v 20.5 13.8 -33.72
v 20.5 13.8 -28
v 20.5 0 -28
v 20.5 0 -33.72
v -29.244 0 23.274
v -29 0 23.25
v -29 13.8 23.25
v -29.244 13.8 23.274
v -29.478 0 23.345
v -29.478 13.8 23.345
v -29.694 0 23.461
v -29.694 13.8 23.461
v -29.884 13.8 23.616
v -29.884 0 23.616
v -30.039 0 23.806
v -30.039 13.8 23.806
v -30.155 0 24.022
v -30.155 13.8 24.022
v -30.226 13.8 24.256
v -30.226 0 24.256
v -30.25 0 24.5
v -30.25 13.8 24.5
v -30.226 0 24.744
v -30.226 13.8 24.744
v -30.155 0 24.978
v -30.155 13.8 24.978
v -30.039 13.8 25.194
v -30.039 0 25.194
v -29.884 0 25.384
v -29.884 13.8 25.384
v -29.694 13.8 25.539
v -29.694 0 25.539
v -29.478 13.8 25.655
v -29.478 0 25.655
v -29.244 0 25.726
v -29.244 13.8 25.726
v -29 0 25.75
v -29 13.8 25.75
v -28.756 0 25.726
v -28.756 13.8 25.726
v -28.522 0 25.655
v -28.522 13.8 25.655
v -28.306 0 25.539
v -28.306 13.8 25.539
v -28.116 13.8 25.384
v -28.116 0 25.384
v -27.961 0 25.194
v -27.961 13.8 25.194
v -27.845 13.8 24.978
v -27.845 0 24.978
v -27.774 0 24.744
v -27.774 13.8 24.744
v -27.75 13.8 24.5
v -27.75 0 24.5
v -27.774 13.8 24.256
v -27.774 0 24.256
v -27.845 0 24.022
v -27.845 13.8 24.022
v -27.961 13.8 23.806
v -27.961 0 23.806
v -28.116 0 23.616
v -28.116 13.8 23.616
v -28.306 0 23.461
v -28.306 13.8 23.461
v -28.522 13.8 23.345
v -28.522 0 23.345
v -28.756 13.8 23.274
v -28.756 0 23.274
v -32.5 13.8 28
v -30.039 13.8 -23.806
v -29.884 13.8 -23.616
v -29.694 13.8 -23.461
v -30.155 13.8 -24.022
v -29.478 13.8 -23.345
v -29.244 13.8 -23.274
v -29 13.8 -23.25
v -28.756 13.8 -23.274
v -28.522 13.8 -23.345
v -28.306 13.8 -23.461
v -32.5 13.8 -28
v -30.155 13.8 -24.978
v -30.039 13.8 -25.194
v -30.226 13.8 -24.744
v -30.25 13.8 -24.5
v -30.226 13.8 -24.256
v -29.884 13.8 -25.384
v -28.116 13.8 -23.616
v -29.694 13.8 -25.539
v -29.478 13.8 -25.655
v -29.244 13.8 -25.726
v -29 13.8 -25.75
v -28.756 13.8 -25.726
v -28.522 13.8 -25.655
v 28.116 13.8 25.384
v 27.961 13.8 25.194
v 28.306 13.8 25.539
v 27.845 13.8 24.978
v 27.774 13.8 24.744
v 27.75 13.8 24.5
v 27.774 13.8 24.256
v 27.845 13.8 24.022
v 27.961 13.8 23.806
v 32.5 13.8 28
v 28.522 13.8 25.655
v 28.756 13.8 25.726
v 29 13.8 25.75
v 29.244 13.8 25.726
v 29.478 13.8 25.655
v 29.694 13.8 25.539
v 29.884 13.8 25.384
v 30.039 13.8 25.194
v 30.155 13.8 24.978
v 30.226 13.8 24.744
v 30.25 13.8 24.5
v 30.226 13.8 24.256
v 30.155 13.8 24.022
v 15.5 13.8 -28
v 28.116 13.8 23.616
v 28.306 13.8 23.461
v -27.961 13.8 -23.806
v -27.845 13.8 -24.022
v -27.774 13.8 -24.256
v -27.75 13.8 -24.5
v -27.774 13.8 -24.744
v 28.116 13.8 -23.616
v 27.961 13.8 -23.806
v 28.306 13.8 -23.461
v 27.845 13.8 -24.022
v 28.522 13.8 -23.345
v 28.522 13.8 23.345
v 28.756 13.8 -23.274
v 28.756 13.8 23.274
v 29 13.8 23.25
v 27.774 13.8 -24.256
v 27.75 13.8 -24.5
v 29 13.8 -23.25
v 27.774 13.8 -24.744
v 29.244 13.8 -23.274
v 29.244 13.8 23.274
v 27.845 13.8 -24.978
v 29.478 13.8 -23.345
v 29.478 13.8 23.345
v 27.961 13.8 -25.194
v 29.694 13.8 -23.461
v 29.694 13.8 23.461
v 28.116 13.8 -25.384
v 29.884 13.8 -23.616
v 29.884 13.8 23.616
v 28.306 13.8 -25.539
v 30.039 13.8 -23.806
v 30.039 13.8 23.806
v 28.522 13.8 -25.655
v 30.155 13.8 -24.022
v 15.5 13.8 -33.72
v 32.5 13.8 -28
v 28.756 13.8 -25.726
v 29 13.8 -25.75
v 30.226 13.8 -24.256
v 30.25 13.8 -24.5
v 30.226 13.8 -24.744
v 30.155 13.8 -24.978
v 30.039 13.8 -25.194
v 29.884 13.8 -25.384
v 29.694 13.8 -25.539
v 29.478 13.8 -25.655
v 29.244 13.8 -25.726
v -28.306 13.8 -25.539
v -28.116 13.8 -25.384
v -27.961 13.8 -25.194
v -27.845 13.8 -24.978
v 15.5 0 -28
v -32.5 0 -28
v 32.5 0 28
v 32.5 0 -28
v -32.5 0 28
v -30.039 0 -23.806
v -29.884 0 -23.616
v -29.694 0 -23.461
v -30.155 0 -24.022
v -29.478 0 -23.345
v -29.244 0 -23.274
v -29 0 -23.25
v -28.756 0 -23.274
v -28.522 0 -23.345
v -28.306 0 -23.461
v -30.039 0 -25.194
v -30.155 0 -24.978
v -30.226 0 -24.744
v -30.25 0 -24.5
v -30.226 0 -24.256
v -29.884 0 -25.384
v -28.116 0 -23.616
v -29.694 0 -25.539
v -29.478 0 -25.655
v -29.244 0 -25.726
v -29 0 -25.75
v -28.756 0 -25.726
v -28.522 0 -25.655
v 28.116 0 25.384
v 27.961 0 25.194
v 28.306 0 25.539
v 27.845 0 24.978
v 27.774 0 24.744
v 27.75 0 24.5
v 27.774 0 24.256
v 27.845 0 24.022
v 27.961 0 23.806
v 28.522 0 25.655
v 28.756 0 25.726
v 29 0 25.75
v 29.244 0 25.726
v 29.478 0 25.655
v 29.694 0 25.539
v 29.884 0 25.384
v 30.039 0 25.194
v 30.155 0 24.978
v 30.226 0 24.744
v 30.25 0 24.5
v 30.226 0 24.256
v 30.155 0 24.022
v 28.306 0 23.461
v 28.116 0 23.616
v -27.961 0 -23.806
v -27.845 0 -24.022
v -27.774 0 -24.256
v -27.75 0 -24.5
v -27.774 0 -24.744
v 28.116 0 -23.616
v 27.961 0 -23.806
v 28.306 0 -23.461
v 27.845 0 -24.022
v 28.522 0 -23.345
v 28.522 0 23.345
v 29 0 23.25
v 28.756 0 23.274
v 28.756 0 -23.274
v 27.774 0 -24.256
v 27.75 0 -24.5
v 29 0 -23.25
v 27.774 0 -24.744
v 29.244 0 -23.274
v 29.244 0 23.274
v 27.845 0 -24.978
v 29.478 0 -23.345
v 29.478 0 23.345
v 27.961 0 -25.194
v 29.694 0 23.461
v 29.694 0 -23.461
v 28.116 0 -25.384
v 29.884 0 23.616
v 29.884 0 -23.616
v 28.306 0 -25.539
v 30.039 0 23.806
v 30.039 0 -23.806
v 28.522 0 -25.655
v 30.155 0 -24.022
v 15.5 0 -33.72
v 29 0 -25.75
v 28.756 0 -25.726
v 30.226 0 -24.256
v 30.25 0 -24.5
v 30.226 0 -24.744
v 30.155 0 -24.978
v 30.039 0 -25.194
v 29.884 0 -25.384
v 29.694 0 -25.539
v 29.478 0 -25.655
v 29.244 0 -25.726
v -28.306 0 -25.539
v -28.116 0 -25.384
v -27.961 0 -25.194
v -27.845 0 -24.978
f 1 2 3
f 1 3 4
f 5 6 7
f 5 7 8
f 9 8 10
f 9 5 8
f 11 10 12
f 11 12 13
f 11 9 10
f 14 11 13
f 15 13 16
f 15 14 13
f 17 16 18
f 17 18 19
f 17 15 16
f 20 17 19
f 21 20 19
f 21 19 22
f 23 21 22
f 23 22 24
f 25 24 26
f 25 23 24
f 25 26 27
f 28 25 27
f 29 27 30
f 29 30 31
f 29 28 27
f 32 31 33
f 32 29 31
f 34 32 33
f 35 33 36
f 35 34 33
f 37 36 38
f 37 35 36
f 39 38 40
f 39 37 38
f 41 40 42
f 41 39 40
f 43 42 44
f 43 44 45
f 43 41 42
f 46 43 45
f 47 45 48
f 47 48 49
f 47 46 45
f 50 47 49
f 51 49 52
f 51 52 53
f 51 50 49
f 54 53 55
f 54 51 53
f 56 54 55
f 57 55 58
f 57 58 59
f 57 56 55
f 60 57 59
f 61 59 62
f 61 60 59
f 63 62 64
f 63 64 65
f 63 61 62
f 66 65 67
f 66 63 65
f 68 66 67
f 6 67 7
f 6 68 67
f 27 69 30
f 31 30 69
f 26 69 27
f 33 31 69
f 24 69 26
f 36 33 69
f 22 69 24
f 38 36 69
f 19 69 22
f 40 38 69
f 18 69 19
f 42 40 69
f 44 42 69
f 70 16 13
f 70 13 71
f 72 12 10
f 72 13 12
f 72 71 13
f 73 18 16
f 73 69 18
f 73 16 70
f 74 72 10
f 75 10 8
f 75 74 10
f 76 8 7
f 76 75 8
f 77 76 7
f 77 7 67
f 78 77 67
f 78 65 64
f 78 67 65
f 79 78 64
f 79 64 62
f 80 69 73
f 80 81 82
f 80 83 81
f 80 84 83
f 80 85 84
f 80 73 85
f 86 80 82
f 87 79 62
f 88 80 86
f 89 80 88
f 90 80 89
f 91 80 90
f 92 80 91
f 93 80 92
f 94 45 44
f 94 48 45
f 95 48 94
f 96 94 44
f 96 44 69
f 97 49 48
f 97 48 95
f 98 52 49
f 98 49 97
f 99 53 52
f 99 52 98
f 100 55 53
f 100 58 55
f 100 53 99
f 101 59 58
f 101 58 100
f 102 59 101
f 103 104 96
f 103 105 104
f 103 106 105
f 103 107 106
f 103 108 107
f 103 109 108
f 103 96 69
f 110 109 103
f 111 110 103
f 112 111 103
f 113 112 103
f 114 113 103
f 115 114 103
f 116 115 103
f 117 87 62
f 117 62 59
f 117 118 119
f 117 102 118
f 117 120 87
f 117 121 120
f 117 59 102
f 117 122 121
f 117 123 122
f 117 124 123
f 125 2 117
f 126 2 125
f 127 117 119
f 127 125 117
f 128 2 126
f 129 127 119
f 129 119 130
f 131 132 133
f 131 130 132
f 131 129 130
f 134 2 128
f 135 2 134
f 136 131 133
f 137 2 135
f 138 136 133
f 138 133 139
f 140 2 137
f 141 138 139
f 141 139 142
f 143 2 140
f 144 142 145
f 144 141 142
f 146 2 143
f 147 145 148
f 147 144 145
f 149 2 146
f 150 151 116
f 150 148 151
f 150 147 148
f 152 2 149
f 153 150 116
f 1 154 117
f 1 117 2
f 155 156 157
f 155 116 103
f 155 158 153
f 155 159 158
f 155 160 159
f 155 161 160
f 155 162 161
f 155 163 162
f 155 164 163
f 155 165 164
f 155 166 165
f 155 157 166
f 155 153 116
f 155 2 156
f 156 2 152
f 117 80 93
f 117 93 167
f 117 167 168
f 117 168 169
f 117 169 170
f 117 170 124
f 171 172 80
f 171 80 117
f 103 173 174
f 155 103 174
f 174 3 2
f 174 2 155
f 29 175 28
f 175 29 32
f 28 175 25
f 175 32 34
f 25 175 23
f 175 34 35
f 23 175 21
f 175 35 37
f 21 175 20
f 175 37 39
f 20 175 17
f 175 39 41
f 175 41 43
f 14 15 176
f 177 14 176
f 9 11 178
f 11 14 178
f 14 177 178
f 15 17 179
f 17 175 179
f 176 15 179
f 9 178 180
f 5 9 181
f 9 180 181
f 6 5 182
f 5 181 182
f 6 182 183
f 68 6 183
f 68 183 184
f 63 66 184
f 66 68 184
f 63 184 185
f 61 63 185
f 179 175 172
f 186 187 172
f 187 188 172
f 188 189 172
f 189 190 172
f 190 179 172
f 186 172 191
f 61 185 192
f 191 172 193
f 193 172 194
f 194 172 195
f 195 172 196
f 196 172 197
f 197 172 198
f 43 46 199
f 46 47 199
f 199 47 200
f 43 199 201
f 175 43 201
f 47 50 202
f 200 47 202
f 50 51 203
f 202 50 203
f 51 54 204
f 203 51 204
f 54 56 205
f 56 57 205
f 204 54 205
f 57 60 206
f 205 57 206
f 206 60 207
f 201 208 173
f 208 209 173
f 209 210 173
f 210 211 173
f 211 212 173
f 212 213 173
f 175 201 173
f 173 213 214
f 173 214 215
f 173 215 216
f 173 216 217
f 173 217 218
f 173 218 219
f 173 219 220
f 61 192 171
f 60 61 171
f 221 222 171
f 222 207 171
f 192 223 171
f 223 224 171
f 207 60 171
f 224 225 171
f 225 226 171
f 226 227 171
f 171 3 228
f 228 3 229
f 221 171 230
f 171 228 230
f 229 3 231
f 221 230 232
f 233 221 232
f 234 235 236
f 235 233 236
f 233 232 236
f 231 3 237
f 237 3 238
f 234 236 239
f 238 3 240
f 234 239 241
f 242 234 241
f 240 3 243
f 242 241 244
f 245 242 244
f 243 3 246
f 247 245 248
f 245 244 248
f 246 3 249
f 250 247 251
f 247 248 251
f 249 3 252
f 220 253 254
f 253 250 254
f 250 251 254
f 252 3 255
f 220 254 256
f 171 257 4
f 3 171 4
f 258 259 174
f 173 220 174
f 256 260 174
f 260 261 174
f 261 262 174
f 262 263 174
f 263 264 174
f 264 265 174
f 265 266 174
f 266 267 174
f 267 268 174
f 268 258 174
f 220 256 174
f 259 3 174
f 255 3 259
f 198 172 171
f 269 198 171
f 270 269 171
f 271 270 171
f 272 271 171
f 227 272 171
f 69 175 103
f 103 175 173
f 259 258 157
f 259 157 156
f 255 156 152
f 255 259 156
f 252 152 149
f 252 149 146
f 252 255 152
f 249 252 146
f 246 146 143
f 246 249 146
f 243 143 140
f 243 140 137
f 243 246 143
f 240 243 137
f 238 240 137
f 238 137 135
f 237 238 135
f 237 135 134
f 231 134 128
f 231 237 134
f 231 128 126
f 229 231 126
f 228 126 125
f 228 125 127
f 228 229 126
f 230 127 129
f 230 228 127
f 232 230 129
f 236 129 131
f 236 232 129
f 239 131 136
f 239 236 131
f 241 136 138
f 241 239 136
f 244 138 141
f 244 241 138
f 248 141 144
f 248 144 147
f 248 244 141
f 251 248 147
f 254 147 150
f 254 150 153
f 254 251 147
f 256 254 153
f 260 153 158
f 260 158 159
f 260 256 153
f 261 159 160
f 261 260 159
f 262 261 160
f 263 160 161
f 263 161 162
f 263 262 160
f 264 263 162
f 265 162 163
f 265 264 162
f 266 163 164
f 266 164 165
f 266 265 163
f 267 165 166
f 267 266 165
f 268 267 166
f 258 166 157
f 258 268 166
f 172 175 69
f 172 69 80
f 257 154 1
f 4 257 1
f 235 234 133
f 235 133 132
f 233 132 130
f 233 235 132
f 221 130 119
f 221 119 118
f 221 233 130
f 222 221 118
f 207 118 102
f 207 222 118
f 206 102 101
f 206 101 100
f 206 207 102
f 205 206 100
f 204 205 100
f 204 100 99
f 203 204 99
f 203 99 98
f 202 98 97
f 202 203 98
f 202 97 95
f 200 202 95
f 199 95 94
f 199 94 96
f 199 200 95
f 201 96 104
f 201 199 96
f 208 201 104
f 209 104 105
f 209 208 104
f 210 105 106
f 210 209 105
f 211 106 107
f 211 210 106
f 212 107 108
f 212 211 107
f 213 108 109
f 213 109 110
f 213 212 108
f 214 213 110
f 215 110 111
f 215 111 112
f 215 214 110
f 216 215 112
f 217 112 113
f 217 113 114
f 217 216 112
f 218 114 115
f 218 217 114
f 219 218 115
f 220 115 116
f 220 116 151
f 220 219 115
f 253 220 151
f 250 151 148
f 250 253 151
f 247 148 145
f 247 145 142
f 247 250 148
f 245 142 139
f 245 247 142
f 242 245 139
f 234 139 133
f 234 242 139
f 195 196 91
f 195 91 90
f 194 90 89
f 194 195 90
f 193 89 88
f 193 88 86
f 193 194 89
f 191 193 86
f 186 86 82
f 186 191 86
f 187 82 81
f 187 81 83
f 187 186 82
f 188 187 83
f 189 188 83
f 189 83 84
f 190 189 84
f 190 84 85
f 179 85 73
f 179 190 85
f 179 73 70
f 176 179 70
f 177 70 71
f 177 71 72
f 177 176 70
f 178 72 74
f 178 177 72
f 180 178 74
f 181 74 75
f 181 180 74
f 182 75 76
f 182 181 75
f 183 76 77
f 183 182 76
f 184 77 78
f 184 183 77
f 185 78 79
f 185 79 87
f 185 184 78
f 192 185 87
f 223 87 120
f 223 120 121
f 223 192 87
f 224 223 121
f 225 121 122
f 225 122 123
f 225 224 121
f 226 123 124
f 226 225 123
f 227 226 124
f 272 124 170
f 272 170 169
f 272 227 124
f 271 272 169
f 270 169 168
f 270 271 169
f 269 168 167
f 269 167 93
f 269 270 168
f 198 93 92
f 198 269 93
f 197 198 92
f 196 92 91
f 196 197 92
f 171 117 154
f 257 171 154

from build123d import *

# Parameters (mm, degrees)
SKETCH_1_W      = 65
SKETCH_1_H      = 56
SKETCH_1_R      = 1.25
EXTRUDE_1_DEPTH = 13.8
SKETCH_2_W      = 5
SKETCH_2_H      = 5.72
EXTRUDE_2_DEPTH = 13.8


with BuildPart() as part:
    # 草图1 → 凸台-拉伸1 (new body)
    with BuildSketch(Plane(origin=(0, 0, 0), x_dir=(1, 0, 0), z_dir=(0, 1, 0))):
        Rectangle(SKETCH_1_W, SKETCH_1_H)
        with Locations(Location((-29, 24.5, 0), (0, 0, 90))):
            Circle(SKETCH_1_R, mode=Mode.SUBTRACT)
        with Locations(Location((29, 24.5, 0), (0, 0, 90))):
            Circle(SKETCH_1_R, mode=Mode.SUBTRACT)
        with Locations(Location((29, -24.5, 0), (0, 0, 90))):
            Circle(SKETCH_1_R, mode=Mode.SUBTRACT)
        with Locations(Location((-29, -24.5, 0), (0, 0, 90))):
            Circle(SKETCH_1_R, mode=Mode.SUBTRACT)
    extrude(amount=EXTRUDE_1_DEPTH)

    # 草图2 → 凸台-拉伸2 (add)
    with BuildSketch(Plane(origin=(0, 13.8, 0), x_dir=(1, 0, 0), z_dir=(0, 1, 0))):
        with Locations((18, 30.86)):
            Rectangle(SKETCH_2_W, SKETCH_2_H)
    extrude(amount=-EXTRUDE_2_DEPTH)


solid = part.part
